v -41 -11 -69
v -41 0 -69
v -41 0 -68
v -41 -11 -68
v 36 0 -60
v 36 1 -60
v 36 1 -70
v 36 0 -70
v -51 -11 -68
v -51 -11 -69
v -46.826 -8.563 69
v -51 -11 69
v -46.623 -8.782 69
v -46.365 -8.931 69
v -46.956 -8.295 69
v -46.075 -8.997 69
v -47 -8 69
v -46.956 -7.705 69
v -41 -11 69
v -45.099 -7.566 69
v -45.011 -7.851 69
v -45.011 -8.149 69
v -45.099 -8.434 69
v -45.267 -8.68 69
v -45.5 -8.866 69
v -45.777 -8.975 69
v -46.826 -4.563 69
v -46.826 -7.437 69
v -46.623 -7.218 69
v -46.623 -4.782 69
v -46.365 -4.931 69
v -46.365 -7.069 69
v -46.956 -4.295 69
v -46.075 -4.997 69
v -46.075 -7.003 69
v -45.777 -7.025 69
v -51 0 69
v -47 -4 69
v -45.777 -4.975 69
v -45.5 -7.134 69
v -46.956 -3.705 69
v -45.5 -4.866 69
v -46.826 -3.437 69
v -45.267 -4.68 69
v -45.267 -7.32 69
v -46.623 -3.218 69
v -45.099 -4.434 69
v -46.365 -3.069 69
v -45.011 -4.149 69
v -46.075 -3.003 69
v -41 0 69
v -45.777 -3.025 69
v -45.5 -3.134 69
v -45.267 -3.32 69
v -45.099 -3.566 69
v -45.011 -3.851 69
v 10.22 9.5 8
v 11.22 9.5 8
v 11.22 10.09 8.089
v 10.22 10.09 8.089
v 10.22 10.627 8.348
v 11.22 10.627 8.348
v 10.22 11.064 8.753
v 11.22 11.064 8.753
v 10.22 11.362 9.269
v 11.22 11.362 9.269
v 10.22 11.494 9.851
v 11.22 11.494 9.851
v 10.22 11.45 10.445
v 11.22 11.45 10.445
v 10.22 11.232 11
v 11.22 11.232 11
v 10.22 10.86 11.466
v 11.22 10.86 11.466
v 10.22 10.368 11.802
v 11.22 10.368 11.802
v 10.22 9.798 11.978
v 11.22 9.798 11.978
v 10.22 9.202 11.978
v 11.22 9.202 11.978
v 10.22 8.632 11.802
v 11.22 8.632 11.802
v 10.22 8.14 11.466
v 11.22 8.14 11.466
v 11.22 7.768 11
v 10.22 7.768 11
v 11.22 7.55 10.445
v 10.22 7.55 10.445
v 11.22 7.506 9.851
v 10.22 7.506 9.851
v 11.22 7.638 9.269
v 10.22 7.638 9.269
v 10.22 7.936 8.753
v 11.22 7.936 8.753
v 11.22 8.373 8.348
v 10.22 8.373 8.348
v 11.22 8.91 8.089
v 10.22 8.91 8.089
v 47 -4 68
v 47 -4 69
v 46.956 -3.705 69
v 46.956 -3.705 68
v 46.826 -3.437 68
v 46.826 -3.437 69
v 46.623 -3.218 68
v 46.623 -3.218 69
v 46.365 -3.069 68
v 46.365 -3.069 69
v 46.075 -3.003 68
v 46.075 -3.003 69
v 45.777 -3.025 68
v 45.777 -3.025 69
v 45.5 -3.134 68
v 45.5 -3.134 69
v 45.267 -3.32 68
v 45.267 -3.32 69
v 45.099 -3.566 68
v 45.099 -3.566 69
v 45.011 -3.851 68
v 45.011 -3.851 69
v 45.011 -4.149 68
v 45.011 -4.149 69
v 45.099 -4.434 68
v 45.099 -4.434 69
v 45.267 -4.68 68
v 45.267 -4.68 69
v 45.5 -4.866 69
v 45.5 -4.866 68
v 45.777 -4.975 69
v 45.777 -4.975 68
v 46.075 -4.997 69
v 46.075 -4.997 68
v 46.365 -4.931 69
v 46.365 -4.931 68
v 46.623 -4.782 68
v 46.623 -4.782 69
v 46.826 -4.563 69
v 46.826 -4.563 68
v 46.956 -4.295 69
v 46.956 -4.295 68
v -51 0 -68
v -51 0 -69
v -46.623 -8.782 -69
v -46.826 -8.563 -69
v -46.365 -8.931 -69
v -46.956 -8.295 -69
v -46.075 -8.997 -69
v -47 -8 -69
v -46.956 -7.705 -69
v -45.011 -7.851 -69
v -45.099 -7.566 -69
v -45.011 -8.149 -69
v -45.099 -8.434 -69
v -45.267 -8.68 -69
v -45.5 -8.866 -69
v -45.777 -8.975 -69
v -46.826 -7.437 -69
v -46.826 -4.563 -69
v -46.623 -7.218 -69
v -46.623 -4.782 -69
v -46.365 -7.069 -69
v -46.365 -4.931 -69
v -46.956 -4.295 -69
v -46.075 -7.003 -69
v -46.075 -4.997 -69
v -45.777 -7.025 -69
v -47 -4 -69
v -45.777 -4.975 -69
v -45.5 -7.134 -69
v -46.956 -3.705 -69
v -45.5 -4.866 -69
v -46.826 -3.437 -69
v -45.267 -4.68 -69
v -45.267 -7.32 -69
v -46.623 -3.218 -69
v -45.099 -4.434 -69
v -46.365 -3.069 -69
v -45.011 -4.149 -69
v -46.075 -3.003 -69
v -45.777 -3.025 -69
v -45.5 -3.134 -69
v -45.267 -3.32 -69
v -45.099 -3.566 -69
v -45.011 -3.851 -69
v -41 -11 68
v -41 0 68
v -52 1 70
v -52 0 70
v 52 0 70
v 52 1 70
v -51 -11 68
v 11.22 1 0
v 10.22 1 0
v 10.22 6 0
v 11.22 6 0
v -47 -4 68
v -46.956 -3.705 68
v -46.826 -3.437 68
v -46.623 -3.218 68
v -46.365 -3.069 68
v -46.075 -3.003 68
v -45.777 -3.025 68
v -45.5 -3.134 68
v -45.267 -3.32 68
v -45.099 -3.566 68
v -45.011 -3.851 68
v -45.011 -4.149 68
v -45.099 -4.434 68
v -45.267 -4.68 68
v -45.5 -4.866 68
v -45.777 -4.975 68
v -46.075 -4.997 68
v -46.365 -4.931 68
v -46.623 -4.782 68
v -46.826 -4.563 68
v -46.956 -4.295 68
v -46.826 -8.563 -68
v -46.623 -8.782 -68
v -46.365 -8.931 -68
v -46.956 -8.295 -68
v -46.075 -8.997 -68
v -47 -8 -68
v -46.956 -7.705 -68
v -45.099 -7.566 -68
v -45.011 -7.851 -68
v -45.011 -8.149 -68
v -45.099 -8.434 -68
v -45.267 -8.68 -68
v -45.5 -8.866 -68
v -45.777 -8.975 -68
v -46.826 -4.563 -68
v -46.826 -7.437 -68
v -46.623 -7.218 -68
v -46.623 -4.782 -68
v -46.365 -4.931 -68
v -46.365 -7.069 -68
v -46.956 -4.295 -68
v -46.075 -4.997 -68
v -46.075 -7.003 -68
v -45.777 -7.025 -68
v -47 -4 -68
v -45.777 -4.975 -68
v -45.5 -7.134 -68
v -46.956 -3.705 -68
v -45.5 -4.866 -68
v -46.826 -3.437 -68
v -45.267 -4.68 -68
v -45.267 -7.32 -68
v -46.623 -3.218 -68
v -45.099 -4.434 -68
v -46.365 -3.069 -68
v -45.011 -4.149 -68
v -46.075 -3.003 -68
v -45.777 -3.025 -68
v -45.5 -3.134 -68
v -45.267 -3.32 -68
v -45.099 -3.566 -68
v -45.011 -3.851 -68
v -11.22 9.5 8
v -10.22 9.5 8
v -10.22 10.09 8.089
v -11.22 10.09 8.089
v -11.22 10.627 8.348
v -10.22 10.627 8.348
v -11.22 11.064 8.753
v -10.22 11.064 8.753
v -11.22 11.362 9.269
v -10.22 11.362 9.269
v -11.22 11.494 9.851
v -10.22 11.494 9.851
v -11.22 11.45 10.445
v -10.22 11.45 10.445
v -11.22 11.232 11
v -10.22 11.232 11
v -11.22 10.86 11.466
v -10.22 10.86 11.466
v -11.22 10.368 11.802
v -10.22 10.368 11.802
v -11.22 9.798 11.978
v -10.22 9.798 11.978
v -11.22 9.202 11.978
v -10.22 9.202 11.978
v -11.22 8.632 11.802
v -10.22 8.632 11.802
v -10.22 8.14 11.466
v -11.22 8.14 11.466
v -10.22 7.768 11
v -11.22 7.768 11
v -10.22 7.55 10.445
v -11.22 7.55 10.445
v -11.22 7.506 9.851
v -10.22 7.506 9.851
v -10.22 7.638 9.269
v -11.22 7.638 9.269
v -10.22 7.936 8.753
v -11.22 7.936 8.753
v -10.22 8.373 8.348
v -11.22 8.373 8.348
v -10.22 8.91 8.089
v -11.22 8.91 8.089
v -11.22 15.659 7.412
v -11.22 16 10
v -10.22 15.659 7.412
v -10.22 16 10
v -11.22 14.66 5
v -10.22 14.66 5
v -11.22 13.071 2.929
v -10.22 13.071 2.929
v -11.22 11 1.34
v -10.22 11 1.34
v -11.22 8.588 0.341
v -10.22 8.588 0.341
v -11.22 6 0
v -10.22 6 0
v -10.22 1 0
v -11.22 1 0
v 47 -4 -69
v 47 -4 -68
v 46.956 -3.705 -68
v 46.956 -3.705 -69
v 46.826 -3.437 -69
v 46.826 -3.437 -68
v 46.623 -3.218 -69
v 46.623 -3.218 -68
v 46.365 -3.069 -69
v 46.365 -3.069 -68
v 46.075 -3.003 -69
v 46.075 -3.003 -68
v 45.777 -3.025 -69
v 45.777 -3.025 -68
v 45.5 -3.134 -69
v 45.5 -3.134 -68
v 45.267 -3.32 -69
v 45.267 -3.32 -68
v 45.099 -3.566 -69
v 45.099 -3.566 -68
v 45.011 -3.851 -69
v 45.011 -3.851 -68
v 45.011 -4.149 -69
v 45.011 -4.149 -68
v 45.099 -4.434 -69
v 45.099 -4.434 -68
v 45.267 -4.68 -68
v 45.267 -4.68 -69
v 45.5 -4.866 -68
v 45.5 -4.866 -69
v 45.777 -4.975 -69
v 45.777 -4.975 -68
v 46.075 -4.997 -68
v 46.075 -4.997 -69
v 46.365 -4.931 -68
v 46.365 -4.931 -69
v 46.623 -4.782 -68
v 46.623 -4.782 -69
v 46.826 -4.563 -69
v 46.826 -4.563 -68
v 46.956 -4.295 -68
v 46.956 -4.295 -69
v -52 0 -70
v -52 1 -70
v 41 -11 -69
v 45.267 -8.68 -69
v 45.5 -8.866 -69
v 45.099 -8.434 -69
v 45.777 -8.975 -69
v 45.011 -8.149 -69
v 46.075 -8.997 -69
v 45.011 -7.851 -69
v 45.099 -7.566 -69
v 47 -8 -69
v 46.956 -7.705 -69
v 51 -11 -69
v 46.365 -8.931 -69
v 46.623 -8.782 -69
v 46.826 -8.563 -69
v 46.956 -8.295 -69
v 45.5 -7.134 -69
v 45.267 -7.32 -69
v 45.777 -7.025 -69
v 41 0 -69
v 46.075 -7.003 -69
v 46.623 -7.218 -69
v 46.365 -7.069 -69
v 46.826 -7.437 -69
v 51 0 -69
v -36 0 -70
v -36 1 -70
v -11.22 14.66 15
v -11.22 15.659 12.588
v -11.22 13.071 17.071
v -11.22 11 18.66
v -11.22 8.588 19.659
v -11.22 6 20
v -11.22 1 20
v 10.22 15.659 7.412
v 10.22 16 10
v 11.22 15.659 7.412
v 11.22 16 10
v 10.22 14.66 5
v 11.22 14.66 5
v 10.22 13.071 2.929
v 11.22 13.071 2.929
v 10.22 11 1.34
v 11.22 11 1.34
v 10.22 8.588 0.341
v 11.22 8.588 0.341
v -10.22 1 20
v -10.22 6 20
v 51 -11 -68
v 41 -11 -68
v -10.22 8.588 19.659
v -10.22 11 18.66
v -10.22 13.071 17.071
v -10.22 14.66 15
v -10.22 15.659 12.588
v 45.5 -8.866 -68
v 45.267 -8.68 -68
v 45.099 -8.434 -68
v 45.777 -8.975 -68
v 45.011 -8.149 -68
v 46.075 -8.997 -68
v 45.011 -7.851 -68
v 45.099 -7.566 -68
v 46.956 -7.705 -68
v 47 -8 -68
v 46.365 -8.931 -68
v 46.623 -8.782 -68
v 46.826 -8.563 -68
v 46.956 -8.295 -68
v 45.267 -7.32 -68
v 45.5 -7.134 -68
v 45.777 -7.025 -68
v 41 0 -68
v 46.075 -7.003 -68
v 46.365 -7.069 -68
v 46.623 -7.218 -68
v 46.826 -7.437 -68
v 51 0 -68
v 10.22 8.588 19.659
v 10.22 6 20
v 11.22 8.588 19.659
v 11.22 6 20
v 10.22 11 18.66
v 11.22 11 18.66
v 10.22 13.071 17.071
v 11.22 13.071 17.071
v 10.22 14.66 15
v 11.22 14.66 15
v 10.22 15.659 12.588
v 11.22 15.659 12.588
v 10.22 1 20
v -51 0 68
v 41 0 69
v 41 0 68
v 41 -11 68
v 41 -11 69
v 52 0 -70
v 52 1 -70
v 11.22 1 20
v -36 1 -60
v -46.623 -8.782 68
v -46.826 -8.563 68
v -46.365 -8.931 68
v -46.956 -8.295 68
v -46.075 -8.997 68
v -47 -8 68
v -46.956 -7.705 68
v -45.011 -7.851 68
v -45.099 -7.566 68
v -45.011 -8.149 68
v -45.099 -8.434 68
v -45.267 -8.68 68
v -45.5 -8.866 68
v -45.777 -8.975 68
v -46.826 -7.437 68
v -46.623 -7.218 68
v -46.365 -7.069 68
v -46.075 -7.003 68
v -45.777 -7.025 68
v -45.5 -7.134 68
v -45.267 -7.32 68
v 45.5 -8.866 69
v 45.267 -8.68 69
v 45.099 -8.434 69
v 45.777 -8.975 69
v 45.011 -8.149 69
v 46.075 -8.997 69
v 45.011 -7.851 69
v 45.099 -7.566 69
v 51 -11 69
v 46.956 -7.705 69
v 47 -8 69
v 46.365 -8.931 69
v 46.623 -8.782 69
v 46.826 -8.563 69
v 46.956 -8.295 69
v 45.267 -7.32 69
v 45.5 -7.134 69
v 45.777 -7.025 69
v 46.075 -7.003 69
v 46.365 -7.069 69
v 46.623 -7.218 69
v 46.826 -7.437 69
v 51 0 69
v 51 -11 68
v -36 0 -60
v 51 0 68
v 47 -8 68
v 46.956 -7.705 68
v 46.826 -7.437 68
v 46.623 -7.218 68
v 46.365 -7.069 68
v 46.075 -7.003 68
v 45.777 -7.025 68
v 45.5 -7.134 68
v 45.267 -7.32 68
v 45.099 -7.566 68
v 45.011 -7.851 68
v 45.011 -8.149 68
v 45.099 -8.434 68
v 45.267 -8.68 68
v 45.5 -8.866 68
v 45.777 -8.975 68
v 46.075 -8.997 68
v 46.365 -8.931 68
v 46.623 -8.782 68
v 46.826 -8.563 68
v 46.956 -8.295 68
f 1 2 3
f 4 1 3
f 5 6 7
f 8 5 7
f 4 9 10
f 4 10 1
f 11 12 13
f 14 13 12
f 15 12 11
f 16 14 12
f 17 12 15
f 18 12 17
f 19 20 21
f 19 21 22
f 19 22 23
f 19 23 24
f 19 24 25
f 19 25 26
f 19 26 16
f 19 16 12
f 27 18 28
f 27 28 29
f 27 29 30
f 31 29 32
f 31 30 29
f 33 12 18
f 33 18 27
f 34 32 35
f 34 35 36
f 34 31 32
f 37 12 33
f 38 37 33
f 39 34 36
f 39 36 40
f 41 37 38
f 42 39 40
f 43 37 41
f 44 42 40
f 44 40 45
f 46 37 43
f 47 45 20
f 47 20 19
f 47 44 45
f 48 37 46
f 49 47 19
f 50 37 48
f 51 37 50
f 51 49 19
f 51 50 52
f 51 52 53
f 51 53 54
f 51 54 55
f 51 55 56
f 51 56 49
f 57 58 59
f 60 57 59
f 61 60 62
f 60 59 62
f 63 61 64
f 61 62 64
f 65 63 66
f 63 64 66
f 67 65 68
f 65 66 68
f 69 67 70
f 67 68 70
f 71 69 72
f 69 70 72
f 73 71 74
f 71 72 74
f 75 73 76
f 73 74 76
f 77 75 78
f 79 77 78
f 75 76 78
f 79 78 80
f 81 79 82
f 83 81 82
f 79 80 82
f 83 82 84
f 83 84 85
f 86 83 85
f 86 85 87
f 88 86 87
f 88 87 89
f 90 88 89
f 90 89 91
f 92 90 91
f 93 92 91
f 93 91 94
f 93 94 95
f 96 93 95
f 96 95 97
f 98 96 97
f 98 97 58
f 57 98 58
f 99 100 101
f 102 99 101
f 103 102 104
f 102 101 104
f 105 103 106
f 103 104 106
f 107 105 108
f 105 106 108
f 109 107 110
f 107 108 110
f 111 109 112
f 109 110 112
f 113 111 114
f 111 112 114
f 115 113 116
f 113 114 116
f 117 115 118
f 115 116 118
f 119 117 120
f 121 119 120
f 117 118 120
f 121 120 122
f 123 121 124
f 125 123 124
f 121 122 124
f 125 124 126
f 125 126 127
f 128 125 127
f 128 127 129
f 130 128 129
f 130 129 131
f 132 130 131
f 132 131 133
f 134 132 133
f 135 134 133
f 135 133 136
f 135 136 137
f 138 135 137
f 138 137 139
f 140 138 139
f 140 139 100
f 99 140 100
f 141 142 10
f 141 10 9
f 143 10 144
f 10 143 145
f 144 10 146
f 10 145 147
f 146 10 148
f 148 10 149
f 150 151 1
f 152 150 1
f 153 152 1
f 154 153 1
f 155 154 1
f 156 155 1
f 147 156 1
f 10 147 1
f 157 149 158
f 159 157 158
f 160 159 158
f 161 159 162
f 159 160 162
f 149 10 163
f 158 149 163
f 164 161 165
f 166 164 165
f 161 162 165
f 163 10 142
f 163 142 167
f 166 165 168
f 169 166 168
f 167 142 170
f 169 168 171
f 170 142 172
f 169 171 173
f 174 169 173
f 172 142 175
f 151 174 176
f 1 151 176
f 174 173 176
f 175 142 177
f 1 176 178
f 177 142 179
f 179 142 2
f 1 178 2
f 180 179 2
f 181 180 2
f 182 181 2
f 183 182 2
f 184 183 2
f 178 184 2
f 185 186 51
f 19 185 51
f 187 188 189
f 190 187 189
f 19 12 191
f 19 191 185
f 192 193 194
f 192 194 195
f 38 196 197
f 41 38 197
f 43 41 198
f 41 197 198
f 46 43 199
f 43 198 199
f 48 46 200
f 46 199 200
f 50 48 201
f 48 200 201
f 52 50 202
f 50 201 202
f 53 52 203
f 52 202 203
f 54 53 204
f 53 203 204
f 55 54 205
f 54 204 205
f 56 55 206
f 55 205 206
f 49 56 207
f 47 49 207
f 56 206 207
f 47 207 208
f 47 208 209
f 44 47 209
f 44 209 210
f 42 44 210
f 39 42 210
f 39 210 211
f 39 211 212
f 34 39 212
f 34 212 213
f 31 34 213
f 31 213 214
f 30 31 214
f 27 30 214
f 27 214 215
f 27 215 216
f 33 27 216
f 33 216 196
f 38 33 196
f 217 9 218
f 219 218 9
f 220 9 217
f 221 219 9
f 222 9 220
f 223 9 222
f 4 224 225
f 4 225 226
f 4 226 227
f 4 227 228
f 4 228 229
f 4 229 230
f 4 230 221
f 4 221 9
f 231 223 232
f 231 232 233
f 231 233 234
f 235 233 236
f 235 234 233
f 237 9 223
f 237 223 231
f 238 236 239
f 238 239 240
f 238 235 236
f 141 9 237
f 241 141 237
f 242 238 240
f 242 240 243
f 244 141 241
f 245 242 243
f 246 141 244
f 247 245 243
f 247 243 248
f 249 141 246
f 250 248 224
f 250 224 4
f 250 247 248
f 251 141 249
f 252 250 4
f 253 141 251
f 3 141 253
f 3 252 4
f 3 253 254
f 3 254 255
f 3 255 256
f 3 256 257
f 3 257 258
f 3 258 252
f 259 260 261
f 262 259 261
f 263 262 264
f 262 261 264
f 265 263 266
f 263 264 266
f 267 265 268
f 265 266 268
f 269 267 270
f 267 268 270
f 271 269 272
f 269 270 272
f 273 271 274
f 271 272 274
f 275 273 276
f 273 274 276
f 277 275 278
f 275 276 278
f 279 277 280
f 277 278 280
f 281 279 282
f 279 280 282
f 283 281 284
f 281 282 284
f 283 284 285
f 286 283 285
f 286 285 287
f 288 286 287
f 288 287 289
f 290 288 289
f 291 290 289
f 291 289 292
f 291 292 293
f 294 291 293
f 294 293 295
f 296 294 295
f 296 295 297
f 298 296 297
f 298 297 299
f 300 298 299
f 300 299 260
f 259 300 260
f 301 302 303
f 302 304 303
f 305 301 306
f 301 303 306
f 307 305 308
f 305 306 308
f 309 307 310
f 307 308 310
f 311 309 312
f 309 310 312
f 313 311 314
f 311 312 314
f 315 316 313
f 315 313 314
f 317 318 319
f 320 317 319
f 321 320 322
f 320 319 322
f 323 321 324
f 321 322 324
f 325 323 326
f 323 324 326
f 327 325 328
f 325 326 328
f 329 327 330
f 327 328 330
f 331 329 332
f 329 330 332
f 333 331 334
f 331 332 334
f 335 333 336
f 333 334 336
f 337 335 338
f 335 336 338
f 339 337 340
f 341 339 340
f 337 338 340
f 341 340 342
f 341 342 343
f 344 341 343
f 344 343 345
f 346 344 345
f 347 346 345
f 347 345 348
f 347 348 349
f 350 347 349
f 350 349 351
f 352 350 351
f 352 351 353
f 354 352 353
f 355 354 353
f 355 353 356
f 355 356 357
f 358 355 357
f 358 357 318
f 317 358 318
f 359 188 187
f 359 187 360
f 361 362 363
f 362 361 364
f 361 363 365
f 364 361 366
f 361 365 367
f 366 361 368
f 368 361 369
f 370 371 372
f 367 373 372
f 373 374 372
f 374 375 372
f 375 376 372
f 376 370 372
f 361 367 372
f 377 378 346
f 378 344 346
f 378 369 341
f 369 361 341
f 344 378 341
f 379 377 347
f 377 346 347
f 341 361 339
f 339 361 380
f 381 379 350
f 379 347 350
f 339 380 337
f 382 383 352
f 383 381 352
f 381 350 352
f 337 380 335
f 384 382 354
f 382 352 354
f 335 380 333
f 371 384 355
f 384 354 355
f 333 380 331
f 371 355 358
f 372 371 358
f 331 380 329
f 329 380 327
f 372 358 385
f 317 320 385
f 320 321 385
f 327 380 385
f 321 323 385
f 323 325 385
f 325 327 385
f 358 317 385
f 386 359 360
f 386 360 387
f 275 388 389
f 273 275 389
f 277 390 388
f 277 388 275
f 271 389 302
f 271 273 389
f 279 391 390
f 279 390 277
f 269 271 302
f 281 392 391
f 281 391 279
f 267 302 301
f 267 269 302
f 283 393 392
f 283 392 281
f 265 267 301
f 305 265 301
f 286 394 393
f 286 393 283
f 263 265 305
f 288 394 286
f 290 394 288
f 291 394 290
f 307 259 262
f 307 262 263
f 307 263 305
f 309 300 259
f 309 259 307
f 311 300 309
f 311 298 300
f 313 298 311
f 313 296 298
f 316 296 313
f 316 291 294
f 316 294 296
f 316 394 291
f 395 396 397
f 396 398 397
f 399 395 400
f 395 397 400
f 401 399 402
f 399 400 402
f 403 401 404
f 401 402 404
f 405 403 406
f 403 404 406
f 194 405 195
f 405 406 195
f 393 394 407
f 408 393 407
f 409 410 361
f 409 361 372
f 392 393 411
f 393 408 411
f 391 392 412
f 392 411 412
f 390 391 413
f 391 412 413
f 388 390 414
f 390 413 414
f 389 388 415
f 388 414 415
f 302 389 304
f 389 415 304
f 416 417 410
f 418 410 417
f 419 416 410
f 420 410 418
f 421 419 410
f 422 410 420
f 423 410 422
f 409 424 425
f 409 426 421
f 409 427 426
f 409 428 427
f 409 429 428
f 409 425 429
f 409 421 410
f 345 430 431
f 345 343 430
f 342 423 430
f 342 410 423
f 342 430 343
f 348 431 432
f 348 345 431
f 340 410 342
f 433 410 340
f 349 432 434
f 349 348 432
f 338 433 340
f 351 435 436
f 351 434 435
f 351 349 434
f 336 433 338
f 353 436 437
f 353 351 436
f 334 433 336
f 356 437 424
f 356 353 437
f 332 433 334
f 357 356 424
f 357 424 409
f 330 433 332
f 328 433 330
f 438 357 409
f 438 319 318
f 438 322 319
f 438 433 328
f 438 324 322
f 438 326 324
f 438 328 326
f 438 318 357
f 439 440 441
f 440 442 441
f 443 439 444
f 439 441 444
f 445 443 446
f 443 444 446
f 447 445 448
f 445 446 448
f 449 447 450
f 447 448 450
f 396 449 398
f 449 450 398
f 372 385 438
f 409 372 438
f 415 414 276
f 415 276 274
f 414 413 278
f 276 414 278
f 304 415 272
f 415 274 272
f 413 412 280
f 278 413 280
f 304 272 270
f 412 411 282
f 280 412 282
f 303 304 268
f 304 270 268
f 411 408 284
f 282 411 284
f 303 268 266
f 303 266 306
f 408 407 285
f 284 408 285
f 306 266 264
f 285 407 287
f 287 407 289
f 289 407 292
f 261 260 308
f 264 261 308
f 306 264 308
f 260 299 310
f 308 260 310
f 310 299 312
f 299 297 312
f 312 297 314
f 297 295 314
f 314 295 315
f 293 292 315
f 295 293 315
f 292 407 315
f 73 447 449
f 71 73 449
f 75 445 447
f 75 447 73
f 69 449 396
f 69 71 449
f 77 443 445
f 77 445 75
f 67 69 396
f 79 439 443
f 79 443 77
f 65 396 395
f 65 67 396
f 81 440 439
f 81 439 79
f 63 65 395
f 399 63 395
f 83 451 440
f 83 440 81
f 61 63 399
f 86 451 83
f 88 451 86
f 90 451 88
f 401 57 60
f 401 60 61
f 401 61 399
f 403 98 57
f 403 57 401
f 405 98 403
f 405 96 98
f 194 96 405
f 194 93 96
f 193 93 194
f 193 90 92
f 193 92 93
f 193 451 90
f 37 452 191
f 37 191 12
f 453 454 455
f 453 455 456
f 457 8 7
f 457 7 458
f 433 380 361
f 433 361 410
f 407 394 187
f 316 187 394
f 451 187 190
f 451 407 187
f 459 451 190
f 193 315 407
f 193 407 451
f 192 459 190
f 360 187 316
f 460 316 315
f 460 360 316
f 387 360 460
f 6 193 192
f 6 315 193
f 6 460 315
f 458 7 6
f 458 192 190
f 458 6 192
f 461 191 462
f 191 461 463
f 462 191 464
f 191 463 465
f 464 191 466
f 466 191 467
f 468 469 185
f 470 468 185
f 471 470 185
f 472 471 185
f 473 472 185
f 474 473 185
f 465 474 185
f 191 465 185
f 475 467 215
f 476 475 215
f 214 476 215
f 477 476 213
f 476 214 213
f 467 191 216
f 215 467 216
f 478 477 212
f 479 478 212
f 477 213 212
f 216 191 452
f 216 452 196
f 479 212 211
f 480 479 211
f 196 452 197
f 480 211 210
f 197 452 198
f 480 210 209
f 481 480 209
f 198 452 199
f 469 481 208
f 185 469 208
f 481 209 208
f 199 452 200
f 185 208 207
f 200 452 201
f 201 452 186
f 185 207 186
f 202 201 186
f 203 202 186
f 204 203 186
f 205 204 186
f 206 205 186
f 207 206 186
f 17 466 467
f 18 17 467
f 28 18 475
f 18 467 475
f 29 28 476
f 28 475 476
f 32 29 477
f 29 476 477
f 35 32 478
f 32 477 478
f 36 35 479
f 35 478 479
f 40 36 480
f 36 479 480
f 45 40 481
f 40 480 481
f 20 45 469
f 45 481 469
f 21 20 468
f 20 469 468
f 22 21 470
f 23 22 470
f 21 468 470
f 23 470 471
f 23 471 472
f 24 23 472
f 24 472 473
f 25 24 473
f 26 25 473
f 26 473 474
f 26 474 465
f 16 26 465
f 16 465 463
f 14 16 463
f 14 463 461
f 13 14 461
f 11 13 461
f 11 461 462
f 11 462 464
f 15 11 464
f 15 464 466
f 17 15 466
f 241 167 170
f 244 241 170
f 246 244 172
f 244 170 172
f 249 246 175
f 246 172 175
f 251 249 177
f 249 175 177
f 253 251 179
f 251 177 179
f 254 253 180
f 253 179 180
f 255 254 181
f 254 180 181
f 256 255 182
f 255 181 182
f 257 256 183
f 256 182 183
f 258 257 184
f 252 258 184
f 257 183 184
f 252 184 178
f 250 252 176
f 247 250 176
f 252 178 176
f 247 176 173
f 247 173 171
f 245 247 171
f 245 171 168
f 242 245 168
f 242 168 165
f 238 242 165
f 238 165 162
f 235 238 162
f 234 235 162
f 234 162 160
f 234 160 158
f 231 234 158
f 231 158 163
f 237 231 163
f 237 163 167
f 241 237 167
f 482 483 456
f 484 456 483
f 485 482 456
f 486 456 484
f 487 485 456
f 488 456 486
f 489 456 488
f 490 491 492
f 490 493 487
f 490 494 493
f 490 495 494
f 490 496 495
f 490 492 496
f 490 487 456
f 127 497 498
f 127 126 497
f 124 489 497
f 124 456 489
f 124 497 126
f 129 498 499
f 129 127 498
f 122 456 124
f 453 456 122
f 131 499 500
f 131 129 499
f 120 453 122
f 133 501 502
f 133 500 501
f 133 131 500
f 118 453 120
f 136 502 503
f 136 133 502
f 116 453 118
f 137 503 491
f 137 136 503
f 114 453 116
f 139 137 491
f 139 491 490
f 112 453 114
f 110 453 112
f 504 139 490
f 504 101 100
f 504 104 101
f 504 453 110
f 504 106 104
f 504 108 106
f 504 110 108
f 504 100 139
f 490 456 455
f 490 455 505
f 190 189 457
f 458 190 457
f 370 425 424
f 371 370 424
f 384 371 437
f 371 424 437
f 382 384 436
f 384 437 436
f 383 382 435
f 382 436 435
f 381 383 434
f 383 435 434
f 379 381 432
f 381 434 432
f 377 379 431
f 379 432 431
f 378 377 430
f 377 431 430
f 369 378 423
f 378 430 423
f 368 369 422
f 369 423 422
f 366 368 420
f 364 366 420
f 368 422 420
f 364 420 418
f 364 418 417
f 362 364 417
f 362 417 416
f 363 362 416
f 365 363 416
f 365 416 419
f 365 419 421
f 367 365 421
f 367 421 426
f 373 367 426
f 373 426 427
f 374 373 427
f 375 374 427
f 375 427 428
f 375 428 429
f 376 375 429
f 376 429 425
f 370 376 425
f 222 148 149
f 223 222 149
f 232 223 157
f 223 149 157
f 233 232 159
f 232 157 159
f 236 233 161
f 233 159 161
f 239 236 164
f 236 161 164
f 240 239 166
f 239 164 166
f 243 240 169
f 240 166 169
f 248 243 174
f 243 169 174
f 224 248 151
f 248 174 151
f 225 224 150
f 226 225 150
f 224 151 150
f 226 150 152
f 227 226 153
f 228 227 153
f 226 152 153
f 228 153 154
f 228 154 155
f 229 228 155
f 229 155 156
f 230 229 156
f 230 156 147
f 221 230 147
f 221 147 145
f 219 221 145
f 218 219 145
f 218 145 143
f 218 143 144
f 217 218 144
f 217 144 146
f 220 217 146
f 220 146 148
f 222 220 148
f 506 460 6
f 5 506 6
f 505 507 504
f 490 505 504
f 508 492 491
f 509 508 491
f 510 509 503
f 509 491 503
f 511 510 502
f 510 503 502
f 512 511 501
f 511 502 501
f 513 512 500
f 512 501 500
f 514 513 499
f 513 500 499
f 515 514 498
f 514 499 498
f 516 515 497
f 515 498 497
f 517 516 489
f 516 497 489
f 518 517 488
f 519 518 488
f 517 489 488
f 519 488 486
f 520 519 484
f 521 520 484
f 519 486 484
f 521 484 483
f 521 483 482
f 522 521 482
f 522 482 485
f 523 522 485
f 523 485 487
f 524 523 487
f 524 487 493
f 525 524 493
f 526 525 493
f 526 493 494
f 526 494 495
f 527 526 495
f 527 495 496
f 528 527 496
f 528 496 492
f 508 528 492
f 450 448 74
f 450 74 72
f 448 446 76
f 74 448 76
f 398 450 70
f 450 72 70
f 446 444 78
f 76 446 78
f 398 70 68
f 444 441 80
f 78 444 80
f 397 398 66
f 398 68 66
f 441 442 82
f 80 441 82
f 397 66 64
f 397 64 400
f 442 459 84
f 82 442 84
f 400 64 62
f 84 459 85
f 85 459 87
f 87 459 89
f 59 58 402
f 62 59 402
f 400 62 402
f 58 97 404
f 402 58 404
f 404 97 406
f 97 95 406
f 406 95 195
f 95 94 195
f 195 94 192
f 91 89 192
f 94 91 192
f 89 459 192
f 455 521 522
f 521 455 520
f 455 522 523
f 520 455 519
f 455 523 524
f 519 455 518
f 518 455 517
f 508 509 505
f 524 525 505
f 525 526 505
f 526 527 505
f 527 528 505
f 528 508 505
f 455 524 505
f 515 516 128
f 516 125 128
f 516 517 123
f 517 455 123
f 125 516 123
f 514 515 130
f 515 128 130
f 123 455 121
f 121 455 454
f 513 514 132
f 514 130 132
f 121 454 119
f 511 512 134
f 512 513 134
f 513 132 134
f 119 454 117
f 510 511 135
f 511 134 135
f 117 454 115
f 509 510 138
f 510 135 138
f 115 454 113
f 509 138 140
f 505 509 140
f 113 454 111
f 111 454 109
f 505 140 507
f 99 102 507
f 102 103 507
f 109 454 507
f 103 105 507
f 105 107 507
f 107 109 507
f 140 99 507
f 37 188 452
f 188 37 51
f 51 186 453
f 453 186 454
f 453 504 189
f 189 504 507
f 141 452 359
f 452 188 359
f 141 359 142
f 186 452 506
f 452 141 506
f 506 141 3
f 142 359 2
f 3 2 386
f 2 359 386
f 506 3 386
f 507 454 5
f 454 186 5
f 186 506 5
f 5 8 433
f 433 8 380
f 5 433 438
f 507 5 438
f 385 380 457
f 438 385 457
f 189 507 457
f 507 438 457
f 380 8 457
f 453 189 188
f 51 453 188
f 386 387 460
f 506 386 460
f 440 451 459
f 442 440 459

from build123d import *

# Parameters (mm, degrees)
SKETCH1_W           = 104
SKETCH1_H           = 140
BOSS_EXTRUDE1_DEPTH = 1
SKETCH2_W           = 1
SKETCH2_H           = 20
BOSS_EXTRUDE2_DEPTH = 15
SKETCH6_R           = 2
CUT_EXTRUDE1_DEPTH  = 30
FILLET3_R           = 10
FILLET4_R           = 10
FILLET5_R           = 10
FILLET6_R           = 10
SKETCH9_W           = 10
SKETCH9_H           = 1
BOSS_EXTRUDE5_DEPTH = 11
SKETCH10_R          = 1
CUT_EXTRUDE2_DEPTH  = 150.268214969
SKETCH12_R          = 1
CUT_EXTRUDE3_DEPTH  = 150.268214969
CUT_EXTRUDE4_DEPTH  = 12


with BuildPart() as part:
    # Sketch1 → Boss-Extrude1 (new body)
    with BuildSketch(Plane(origin=(0, 0, 0), x_dir=(1, 0, 0), z_dir=(0, 1, 0))):
        Rectangle(SKETCH1_W, SKETCH1_H)
    extrude(amount=BOSS_EXTRUDE1_DEPTH)

    # Sketch2 → Boss-Extrude2 (add)
    with BuildSketch(Plane(origin=(0, 1, 0), x_dir=(1, 0, 0), z_dir=(0, 1, 0))):
        with Locations((-10.719821852, -10)):
            Rectangle(SKETCH2_W, SKETCH2_H)
        with Locations((10.719821852, -10)):
            Rectangle(SKETCH2_W, SKETCH2_H)
    extrude(amount=BOSS_EXTRUDE2_DEPTH)

    # Sketch6 → Cut-Extrude1 (cut)
    with BuildSketch(Plane(origin=(11.219821852, 0, 0), x_dir=(0, 0, -1), z_dir=(1, 0, 0))):
        with Locations((-10, 9.5)):
            Circle(SKETCH6_R)
    extrude(amount=-CUT_EXTRUDE1_DEPTH, mode=Mode.SUBTRACT)

    # Fillet3
    fillet3_edges = [part.edges().sort_by_distance(p)[0] for p in [
        (10.719821852, 16, 20),
    ]]
    fillet(fillet3_edges, radius=FILLET3_R)

    # Fillet4
    fillet4_edges = [part.edges().sort_by_distance(p)[0] for p in [
        (10.719821852, 16, 0),
    ]]
    fillet(fillet4_edges, radius=FILLET4_R - 0.0001)  # a hair under: the kernel refuses the full size

    # Fillet5
    fillet5_edges = [part.edges().sort_by_distance(p)[0] for p in [
        (-10.719821852, 16, 20),
    ]]
    fillet(fillet5_edges, radius=FILLET5_R)

    # Fillet6
    fillet6_edges = [part.edges().sort_by_distance(p)[0] for p in [
        (-10.719821852, 16, 0),
    ]]
    fillet(fillet6_edges, radius=FILLET6_R - 0.0001)  # a hair under: the kernel refuses the full size

    # Sketch9 → Boss-Extrude5 (add)
    with BuildSketch(Plane.XZ):
        with Locations((46, -68.5)):
            Rectangle(SKETCH9_W, SKETCH9_H)
        with Locations((-46, -68.5)):
            Rectangle(SKETCH9_W, SKETCH9_H)
        with Locations((-46, 68.5)):
            Rectangle(SKETCH9_W, SKETCH9_H)
        with Locations((46, 68.5)):
            Rectangle(SKETCH9_W, SKETCH9_H)
    extrude(amount=BOSS_EXTRUDE5_DEPTH)

    # Sketch10 → Cut-Extrude2 (cut, through all)
    with BuildSketch(Plane(origin=(0, 0, -69), x_dir=(-1, 0, 0), z_dir=(0, 0, -1))):
        with Locations((46, -8)):
            Circle(SKETCH10_R)
        with Locations((46, -4)):
            Circle(SKETCH10_R)
    extrude(amount=-CUT_EXTRUDE2_DEPTH, mode=Mode.SUBTRACT)

    # Sketch12 → Cut-Extrude3 (cut, through all)
    with BuildSketch(Plane.XY.offset(69)):
        with Locations((46, -4)):
            Circle(SKETCH12_R)
        with Locations((46, -8)):
            Circle(SKETCH12_R)
    extrude(amount=-CUT_EXTRUDE3_DEPTH, mode=Mode.SUBTRACT)

    # Sketch13 → Cut-Extrude4 (cut)
    with BuildSketch(Plane(origin=(0, 1, 0), x_dir=(1, 0, 0), z_dir=(0, 1, 0))):
        Polygon((0, 70), (-36, 70), (-36, 60), (36, 60), (36, 70), align=None)
    extrude(amount=-CUT_EXTRUDE4_DEPTH, mode=Mode.SUBTRACT)


solid = part.part
